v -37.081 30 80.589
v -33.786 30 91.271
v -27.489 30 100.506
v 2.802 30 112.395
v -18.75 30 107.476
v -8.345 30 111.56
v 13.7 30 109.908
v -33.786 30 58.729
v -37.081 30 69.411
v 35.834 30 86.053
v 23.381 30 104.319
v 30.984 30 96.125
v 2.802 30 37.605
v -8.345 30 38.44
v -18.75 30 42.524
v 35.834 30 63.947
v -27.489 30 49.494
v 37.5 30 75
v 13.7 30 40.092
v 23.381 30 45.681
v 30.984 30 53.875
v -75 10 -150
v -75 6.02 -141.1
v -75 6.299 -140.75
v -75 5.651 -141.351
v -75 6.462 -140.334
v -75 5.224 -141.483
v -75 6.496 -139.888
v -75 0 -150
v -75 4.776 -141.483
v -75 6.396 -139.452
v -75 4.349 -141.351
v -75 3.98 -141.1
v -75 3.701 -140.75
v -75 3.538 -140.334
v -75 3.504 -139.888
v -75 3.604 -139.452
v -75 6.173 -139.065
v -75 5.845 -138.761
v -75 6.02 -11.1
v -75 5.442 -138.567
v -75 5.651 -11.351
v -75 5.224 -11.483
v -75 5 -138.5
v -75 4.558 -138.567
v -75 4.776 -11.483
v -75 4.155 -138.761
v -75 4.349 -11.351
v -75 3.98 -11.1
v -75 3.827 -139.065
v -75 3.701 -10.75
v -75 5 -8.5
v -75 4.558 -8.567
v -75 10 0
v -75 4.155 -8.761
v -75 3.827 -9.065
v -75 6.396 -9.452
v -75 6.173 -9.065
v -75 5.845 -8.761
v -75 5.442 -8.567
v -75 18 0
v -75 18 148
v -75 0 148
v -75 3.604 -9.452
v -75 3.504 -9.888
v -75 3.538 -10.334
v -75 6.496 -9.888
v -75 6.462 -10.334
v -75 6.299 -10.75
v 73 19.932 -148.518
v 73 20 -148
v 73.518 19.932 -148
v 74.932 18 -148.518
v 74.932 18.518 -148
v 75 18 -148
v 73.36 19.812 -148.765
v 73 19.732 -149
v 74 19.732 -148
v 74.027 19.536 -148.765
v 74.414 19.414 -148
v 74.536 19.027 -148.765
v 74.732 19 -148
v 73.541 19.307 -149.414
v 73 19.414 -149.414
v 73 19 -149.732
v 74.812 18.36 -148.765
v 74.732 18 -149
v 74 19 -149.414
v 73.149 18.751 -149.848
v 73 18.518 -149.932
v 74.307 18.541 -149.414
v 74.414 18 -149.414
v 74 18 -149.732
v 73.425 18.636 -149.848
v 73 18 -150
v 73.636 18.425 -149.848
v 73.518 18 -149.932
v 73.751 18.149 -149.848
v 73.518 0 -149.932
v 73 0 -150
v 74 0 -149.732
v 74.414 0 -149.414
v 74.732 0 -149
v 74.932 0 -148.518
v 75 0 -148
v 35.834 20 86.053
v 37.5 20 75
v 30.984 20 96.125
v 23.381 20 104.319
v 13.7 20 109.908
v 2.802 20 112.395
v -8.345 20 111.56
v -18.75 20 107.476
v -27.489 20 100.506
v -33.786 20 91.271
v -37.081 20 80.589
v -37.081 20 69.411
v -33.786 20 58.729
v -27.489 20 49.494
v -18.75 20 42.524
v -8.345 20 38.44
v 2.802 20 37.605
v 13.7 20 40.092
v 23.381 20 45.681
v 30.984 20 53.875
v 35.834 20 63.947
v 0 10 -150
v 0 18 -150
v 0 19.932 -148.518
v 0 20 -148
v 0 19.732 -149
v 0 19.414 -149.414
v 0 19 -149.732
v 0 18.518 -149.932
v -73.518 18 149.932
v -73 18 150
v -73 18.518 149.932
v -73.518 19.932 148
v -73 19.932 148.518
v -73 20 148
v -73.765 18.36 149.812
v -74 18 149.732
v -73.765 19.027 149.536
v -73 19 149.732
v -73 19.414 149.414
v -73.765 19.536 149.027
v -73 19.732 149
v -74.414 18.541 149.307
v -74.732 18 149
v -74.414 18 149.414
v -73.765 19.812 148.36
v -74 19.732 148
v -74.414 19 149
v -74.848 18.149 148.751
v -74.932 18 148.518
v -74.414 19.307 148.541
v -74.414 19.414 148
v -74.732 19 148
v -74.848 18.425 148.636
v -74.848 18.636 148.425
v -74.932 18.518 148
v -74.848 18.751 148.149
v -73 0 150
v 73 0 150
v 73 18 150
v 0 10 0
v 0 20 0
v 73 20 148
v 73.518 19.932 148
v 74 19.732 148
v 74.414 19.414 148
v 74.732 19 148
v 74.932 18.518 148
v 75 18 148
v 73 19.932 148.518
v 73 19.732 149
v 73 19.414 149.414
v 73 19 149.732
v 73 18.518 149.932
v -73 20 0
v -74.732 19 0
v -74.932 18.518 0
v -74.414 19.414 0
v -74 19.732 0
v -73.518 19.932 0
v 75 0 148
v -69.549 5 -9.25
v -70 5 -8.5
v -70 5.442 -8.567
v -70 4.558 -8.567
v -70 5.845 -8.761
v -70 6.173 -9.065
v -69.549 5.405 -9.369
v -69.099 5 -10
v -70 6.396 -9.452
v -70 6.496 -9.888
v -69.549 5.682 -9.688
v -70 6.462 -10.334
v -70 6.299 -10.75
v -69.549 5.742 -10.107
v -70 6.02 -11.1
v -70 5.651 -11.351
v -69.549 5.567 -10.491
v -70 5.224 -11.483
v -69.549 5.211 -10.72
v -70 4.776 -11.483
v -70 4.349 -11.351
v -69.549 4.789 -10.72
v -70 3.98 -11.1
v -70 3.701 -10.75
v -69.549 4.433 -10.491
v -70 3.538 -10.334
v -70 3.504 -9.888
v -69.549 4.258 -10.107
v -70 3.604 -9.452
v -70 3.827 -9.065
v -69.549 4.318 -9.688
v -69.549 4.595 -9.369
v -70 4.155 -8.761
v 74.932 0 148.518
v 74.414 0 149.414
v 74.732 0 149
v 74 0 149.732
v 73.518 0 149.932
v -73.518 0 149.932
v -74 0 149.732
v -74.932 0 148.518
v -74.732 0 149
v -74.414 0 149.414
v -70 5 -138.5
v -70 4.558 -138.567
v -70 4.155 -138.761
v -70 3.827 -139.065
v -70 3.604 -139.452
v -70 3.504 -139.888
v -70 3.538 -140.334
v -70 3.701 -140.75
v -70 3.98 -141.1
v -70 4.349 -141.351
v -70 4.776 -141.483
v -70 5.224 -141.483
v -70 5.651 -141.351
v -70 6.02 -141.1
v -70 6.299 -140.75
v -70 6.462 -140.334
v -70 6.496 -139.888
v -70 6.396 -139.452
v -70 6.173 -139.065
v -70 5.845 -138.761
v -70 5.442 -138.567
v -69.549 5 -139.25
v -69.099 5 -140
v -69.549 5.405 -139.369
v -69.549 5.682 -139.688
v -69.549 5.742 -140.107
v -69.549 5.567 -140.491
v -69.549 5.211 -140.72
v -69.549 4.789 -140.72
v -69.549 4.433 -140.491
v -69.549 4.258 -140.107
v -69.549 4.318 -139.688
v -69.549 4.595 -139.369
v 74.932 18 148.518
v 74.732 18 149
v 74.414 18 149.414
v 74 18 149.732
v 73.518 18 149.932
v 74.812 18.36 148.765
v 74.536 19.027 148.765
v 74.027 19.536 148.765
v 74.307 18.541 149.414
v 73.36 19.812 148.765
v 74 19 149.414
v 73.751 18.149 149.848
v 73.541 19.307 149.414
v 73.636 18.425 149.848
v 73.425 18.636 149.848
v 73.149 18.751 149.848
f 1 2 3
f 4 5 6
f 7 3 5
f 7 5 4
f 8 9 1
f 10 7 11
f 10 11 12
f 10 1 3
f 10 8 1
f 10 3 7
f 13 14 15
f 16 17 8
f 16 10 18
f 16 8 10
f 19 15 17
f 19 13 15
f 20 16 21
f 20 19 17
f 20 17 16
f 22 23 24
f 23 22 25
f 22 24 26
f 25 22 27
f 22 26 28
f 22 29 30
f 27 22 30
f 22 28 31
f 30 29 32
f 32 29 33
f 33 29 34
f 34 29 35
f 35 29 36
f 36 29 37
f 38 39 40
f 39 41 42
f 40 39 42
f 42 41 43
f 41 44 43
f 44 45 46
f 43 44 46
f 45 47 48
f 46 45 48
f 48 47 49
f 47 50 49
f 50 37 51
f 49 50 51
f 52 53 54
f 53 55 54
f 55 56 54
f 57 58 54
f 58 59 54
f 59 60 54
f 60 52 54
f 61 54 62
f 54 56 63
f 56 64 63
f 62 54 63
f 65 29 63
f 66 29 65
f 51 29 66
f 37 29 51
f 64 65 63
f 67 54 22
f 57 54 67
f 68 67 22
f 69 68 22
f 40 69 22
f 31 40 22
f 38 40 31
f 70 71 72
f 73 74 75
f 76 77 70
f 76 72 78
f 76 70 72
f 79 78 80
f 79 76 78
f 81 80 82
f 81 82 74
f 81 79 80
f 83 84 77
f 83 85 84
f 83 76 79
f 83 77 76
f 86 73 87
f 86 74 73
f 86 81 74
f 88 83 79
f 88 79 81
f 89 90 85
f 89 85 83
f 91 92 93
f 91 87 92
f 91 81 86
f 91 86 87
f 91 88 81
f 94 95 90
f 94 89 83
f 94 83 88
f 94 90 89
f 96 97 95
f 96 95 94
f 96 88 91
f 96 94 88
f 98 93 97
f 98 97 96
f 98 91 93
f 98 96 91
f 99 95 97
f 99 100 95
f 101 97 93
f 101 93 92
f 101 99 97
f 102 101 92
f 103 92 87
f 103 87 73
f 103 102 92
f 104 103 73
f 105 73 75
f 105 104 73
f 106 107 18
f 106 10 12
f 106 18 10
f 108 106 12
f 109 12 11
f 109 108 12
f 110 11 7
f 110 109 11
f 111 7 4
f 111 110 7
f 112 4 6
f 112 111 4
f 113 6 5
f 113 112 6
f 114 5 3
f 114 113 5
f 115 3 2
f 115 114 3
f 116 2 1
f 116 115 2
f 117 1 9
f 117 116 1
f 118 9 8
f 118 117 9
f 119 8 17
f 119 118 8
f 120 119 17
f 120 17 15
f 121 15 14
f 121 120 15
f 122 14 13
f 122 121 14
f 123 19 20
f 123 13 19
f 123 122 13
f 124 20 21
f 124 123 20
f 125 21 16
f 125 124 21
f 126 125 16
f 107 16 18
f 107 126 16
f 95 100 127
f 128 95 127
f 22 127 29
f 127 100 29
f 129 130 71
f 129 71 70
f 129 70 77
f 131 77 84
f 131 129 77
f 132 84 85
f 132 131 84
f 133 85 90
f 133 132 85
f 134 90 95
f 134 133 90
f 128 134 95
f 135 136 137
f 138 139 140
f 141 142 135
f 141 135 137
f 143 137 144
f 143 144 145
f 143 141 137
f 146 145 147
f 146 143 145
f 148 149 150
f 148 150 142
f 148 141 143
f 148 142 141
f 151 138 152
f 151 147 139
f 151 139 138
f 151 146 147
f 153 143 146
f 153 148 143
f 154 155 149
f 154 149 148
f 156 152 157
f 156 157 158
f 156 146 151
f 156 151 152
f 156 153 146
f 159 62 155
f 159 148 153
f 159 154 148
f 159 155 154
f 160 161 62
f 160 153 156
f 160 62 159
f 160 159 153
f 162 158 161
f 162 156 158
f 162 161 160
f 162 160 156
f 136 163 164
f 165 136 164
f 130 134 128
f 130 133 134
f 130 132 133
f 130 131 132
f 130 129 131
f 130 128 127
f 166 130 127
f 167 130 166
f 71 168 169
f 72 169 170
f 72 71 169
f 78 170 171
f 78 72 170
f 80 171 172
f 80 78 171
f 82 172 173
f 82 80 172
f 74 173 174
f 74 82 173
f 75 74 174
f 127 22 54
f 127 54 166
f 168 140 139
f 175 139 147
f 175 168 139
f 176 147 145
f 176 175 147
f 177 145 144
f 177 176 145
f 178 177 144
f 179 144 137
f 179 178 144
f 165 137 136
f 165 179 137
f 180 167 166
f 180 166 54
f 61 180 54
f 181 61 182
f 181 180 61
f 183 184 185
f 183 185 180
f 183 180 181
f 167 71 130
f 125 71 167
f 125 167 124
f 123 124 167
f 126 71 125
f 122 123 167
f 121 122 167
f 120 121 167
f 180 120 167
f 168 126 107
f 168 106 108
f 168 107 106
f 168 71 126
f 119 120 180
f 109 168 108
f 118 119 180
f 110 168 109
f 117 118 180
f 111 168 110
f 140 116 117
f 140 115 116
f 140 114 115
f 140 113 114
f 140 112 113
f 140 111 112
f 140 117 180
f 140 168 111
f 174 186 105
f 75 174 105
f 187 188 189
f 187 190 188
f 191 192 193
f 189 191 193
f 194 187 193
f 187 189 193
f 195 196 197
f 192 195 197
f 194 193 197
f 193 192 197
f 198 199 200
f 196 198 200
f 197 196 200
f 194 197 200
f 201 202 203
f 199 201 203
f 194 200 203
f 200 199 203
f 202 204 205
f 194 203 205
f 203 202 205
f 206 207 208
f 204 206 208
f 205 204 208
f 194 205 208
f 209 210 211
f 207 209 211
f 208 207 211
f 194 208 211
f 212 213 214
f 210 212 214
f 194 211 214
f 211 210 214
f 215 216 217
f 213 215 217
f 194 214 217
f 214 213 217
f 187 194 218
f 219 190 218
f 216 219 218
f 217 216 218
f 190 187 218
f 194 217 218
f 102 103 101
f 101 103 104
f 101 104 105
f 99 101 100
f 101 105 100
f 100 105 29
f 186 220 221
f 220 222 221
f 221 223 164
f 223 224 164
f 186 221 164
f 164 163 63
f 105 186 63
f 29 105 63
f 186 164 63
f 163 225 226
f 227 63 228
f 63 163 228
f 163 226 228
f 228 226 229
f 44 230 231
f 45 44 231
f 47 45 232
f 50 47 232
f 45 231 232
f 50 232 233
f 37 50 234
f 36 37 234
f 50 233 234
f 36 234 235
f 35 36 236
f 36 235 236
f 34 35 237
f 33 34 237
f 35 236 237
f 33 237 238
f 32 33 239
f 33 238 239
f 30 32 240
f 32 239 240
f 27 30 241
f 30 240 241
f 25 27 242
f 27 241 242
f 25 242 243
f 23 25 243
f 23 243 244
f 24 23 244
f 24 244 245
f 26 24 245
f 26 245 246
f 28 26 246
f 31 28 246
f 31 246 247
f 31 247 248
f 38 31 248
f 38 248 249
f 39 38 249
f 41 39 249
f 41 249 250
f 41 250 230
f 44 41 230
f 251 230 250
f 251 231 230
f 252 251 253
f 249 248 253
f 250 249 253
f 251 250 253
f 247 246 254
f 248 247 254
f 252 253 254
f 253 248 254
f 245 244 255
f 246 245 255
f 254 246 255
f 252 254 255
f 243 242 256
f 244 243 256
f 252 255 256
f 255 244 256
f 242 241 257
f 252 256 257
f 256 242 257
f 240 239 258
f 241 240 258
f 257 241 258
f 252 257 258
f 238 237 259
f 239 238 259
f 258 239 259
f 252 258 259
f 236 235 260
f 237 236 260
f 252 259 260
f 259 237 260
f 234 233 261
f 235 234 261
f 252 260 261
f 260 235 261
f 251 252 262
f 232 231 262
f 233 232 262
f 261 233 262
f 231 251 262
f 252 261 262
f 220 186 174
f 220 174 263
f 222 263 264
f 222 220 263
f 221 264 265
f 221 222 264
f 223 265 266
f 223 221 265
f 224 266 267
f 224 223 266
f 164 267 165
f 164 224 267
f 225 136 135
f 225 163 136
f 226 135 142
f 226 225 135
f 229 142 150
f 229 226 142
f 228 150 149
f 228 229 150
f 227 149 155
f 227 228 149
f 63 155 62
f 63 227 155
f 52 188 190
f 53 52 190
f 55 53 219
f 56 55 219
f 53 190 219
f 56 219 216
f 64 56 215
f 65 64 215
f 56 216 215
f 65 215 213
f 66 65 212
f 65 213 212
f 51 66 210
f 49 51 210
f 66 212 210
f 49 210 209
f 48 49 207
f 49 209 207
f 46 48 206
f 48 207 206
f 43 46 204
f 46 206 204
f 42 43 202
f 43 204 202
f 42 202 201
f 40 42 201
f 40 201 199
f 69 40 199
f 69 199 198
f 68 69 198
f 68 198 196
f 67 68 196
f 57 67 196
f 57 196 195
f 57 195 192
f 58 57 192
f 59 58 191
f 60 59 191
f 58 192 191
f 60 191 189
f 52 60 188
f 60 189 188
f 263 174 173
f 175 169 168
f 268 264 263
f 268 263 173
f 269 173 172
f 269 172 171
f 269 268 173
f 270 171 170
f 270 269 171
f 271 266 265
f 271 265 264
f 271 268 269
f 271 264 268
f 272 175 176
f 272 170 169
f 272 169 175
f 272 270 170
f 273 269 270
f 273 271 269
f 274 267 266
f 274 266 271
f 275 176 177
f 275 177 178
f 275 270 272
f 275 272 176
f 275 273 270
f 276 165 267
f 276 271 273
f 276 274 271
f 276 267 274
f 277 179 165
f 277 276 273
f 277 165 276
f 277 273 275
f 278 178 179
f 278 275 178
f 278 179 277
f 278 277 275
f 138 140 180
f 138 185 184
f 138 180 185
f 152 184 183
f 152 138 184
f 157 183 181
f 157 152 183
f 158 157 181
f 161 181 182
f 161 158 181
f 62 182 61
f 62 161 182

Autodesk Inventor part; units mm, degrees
ref_plane "YZ Plane" through (0, 0, 0) normal (1, 0, 0) x (0, 1, 0)
ref_plane "XZ Plane" through (0, 0, 0) normal (0, 1, 0) x (-1, 0, 0)
ref_plane "XY Plane" through (0, 0, 0) normal (0, 0, 1) x (1, 0, 0)
sketch "Sketch3" plane through (0, 0, 0) normal (0, 1, 0) x (-1, 0, 0)
  line L0 (75, 150) -> (-75, 150)
  line L1 (-75, 150) -> (-75, -150)
  line L2 (-75, -150) -> (75, -150)
  line L3 (75, -150) -> (75, 150)
  line L4 (75, 150) -> (-75, -150) construction
  line L5 (-75, 150) -> (75, -150) construction
  point P0 (0, 0)
  dimension "d7" = 150
  dimension "d8" = 300
extrude "Extrusion3" add sketch "Sketch3" along normal blind 20
sketch "Sketch4" plane through (0, 20, 0) normal (0, 1, 0) x (1, 0, 0)
  line L0 (75, 150) -> (-75, 150) projected
  line L1 (-75, 150) -> (0, 150)
  line L2 (0, 150) -> (0, 0)
  line L3 (0, 0) -> (-75, 0)
  line L4 (-75, 0) -> (-75, 150)
  dimension "d11" = 75
  dimension "d12" = 150
extrude "Extrusion4" cut sketch "Sketch4" against normal blind 10
sketch "Sketch5" plane through (-75, 0, -150) normal (-1, 0, 0) x (0, 0, 1)
  line L0 (0, 0) -> (300, 0) projected
  line L1 (0, 0) -> (0, 10) projected
  line L2 (150, 20) -> (150, 10) projected
  point P0 (150, 0)
  point P1 (10, 5)
  point P2 (140, 5)
  dimension "d15" = 5
  dimension "d16" = 5
  dimension "d17" = 10
  dimension "d18" = 10
hole "Hole1" at (-75, 5, -10) at (-75, 5, -140) direction (1, 0, 0) diameter 3 depth 5 tip angle 118
fillet "Fillet1" radius 2 4 edges at (75, 20, 0) (0, 20, 150) (37.5, 20, -150) (-75, 20, 75)
fillet "Fillet2" radius 2 6 edges at (74.4142, 19.4142, 149.4142) (75, 9, 150) (-74.4142, 19.4142, 149.4142) (-75, 9, 150) (74.4142, 19.4142, -149.4142) (75, 9, -150)
sketch "Sketch6" plane through (0, 20, 0) normal (0, 1, 0) x (1, 0, 0)
  circle A0 centre (0, -75) radius 37.5
  line L0 (-73, -150) -> (73, -150) projected
  line L1 (-75, 0) -> (-75, -148) projected
  point P0 (0, 0)
  dimension "d28" = 75
  dimension "d29" = 75
  dimension "d30" = 75
extrude "Extrusion5" add sketch "Sketch6" along normal blind 10
